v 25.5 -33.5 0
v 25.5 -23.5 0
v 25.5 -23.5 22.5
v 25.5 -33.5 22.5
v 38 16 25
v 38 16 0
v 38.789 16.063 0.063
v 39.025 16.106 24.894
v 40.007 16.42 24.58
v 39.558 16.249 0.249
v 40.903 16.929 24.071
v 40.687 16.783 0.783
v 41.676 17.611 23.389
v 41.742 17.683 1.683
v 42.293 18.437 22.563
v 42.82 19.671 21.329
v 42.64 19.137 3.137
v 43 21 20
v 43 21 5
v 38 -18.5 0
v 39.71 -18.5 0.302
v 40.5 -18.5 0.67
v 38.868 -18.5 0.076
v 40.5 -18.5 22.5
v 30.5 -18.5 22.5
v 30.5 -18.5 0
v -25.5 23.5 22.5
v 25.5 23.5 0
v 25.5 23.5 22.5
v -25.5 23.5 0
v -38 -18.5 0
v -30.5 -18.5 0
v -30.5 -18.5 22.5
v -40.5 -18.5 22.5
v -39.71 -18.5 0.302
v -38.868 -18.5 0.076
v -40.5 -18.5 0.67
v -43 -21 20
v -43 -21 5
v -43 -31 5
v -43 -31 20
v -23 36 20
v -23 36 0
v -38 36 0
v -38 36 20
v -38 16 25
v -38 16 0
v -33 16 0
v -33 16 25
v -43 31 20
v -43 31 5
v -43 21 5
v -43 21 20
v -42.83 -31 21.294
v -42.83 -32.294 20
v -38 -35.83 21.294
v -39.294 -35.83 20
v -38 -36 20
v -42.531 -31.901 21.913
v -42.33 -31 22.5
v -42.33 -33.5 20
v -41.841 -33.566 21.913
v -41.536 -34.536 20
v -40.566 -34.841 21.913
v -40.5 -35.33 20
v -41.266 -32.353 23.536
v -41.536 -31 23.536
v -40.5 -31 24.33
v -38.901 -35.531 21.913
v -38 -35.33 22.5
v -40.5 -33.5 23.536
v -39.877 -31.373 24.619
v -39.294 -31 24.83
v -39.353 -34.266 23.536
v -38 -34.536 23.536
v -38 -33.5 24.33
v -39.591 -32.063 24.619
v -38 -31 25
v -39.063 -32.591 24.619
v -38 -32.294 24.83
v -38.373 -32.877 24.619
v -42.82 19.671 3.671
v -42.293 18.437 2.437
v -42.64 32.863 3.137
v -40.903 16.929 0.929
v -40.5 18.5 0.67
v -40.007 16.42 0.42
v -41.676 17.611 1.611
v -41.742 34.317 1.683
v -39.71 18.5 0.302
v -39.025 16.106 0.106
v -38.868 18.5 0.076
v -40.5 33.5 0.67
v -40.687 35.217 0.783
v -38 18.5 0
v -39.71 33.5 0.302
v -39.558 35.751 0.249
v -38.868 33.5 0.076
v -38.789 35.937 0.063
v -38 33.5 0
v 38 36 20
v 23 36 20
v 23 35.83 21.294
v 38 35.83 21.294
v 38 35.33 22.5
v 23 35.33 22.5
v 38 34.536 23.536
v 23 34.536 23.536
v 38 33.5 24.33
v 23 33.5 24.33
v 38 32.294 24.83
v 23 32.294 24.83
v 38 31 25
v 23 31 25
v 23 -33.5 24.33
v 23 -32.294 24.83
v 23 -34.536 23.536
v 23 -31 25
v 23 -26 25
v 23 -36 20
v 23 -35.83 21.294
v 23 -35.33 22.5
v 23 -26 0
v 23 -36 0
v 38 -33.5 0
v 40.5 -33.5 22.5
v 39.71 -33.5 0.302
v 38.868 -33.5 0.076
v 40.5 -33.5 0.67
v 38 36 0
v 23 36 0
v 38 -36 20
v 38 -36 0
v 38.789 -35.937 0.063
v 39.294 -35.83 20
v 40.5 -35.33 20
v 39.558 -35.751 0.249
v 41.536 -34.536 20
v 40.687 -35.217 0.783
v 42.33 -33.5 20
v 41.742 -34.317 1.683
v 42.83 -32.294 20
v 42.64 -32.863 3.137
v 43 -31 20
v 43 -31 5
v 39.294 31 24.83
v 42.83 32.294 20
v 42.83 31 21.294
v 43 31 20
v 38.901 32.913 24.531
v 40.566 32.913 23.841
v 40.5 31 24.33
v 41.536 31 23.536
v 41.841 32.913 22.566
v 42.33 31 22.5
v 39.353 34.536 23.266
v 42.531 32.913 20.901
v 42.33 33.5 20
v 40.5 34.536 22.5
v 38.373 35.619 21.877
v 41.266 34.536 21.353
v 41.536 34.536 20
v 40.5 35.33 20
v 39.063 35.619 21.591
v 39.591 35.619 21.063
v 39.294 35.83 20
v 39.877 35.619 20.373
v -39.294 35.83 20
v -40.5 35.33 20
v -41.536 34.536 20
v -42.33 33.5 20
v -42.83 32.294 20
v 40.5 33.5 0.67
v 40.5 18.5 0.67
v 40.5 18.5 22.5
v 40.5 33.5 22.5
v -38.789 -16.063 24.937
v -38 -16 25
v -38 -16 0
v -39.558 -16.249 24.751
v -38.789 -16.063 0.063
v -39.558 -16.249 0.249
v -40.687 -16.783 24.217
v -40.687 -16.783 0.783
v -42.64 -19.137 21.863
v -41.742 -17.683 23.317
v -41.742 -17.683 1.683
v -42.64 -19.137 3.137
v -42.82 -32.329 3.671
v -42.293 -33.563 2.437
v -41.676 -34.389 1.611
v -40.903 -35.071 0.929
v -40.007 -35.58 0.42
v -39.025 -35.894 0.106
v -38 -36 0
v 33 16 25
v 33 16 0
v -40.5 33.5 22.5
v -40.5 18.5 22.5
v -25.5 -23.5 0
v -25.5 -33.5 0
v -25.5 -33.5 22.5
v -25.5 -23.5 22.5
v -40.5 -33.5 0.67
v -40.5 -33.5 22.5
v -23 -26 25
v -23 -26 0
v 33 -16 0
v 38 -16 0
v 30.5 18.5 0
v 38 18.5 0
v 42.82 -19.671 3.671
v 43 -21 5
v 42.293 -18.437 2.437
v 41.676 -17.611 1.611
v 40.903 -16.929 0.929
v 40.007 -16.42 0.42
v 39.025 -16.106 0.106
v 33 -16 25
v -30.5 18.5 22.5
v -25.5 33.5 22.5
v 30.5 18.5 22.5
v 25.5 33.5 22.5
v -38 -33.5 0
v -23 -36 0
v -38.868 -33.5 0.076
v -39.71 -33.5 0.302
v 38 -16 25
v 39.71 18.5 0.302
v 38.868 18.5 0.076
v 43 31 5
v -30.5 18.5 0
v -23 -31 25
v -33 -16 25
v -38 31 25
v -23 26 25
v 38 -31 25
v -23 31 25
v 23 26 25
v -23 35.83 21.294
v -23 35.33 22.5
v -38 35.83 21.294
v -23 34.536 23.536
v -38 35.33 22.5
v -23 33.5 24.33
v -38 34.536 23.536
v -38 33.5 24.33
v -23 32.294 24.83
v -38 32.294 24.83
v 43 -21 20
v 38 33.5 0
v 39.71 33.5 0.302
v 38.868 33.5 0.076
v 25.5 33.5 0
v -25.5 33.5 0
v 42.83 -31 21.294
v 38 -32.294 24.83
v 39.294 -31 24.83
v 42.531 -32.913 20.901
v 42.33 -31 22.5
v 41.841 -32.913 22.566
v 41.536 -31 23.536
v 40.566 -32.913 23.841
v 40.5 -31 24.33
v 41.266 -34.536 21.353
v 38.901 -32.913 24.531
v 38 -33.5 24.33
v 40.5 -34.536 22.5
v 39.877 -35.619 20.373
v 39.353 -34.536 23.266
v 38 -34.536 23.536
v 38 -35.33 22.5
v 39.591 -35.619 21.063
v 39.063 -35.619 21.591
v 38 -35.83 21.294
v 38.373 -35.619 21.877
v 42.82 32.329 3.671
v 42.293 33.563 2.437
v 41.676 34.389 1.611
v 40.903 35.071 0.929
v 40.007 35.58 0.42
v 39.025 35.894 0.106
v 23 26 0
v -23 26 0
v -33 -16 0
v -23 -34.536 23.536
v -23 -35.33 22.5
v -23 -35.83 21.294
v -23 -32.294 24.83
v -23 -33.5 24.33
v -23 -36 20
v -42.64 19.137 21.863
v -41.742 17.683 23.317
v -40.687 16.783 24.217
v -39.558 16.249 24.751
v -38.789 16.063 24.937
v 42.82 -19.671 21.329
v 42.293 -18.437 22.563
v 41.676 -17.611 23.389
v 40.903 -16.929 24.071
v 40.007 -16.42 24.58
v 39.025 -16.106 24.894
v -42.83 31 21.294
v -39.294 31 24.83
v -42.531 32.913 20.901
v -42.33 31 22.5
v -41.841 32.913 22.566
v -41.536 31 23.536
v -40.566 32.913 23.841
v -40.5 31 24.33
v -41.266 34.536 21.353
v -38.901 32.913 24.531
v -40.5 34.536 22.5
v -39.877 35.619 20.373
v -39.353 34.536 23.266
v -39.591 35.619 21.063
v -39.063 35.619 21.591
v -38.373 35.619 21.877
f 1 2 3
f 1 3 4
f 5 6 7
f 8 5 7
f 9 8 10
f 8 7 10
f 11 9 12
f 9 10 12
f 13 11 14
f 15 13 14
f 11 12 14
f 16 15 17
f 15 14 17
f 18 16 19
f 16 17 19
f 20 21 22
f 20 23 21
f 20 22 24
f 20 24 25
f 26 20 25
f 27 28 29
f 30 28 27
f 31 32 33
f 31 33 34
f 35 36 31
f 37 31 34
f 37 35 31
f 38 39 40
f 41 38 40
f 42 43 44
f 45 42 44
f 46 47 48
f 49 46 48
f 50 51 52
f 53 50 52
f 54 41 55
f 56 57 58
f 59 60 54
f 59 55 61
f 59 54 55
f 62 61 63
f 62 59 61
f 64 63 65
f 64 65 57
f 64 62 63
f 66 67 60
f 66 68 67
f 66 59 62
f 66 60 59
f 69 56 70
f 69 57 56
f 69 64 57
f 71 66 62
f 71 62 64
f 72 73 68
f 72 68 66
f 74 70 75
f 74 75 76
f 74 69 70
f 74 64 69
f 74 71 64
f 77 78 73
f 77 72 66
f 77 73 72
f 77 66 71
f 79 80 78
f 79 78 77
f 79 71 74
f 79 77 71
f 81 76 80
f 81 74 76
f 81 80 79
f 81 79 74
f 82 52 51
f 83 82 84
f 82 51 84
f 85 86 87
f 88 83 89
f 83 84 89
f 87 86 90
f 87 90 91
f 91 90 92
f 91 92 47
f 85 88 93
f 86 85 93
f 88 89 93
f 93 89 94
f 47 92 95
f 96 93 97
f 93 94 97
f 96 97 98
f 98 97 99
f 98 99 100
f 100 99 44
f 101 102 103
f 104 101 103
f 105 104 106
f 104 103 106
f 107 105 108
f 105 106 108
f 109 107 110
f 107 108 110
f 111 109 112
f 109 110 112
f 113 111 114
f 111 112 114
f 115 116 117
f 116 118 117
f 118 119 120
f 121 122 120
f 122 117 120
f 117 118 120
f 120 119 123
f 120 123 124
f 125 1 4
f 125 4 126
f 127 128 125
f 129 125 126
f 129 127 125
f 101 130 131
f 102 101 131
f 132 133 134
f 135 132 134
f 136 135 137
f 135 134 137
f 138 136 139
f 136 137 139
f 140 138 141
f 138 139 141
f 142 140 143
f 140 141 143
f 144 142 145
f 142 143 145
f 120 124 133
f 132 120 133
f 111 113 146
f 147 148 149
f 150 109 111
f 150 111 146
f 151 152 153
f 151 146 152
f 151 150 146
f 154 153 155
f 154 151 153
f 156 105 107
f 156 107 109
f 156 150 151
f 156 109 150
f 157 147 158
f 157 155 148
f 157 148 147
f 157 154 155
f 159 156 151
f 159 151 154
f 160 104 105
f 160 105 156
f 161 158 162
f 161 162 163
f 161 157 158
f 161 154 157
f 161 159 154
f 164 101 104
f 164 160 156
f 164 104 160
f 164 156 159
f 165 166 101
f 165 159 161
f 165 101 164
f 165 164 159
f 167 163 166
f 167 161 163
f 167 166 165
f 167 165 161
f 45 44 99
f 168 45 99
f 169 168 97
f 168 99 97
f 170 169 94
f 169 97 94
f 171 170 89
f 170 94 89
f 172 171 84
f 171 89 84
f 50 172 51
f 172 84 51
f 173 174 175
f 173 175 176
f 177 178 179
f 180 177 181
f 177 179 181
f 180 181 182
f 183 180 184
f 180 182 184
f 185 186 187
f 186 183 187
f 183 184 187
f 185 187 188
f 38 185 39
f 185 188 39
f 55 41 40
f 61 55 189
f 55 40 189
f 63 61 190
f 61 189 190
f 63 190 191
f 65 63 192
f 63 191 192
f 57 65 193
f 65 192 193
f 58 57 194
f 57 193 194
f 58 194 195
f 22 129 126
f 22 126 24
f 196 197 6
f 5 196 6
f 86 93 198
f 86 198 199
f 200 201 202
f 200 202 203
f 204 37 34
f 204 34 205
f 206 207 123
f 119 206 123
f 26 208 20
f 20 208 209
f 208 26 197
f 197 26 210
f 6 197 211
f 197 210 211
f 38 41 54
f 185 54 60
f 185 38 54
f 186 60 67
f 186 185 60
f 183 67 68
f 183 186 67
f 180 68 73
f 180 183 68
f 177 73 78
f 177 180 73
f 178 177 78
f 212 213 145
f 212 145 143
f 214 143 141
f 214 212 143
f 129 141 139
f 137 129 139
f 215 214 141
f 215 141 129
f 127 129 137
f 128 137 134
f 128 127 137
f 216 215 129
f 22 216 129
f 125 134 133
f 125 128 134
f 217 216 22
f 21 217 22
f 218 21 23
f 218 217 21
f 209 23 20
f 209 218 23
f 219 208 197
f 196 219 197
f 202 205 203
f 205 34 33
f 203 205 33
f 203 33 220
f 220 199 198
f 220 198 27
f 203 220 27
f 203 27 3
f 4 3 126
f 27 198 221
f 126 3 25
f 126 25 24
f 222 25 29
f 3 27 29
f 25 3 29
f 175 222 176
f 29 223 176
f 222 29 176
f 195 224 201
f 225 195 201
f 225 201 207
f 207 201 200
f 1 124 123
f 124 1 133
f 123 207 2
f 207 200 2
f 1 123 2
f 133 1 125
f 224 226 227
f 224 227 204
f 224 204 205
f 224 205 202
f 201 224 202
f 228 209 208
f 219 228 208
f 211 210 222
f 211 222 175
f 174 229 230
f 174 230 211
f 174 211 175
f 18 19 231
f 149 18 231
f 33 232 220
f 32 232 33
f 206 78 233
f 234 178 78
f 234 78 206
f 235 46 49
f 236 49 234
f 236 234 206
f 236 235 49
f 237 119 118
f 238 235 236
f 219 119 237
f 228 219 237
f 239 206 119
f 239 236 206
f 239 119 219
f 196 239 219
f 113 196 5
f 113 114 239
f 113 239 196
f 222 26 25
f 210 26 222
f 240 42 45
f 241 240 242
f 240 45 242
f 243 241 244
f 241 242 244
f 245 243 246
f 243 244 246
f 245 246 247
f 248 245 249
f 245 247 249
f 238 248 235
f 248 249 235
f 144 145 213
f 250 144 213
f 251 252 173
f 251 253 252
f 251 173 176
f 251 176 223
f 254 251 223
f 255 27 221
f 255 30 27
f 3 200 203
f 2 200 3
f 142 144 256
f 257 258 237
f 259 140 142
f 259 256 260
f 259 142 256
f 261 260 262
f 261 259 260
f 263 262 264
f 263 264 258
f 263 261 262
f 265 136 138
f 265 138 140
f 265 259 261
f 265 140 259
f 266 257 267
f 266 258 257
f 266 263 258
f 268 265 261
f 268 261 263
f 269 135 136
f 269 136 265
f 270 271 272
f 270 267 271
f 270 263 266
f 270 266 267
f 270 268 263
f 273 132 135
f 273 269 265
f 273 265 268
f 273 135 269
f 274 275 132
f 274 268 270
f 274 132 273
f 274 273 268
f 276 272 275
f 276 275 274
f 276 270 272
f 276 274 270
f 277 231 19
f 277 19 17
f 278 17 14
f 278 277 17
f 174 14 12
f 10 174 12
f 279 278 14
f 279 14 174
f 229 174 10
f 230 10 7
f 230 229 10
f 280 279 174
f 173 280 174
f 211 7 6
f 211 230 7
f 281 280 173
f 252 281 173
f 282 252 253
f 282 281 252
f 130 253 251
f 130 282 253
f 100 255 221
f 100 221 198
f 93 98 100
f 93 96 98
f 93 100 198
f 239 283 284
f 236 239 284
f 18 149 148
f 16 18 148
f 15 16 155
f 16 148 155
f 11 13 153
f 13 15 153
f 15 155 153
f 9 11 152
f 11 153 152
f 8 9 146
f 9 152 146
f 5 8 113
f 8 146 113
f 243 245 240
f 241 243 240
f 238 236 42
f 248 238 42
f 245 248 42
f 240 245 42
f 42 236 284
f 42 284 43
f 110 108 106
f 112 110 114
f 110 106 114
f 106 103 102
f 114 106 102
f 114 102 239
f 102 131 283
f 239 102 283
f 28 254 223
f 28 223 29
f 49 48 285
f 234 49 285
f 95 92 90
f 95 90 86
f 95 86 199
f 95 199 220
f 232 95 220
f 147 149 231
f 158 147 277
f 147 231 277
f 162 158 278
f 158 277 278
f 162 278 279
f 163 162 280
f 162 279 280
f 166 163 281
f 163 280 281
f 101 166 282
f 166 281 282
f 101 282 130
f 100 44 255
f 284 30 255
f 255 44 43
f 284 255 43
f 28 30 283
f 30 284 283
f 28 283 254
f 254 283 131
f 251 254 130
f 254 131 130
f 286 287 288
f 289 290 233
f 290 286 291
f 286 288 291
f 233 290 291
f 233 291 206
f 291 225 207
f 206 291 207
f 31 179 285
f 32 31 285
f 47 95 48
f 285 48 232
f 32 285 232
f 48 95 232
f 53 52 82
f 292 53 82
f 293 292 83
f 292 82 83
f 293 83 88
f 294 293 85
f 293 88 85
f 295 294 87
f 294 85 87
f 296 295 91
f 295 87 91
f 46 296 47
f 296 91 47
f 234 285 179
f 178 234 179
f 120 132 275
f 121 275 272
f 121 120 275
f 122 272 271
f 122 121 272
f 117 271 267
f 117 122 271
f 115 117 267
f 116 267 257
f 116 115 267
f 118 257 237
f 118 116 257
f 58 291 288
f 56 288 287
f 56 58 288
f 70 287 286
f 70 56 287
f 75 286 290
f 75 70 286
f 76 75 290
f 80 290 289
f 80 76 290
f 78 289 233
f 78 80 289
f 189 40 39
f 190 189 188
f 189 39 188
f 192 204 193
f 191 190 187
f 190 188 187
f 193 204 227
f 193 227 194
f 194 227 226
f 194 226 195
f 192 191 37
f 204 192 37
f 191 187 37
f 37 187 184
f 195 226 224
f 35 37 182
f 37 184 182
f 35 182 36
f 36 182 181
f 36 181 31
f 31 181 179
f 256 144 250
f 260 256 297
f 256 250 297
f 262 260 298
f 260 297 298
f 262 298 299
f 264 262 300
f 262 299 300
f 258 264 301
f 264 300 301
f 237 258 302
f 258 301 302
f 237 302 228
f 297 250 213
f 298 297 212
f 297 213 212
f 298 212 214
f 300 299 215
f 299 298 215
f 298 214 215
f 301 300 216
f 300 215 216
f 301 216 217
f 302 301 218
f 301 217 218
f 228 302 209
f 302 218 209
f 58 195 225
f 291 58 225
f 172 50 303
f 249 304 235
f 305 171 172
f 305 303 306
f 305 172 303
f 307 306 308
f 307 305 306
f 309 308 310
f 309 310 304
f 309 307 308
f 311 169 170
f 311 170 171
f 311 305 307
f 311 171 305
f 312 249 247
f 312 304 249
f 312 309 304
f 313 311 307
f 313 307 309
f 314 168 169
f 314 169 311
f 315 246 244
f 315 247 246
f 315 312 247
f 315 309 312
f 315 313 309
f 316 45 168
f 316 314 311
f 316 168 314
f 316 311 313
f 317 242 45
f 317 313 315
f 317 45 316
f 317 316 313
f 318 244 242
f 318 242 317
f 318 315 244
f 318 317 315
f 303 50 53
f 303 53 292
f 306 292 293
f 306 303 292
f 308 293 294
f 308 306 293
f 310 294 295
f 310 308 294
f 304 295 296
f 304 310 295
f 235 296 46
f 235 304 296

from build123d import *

# Parameters (mm, degrees)
F0_W         = 10
F0_H         = 10
F1_DEPTH     = 25
F2_T         = -2.5
F3_T1_DEPTH  = 27.5
F3_T3_DEPTH  = 27.5
F3_T5_DEPTH  = 27.5
F3_T7_DEPTH  = 27.5
F3_T9_DEPTH  = 32.5
F3_T11_DEPTH = 50
F3_T13_DEPTH = 45
F3_T15_DEPTH = 45
F3_S19_W     = 5
F3_S19_H     = 5
F3_T20_DEPTH = 5
F3_S25_W     = 5
F3_S25_H     = 5
F3_T26_DEPTH = 5
F3_S31_W     = 5
F3_S31_H     = 5
F3_T32_DEPTH = 5
F3_S37_W     = 5
F3_S37_H     = 5
F3_T38_DEPTH = 5


# Not quite as in the source:
# - a fillet or chamfer that OpenCascade refuses, or shapes differently, is made with other operations: its cross-section is extruded or revolved along the edge and cut away or added


with BuildPart() as f1:
    # F0 (on Top) → F1 (new body)
    with BuildSketch(Plane.XY):
        Polygon((-33, 16), (-33, 26), (-23, 26), (-23, 36), (-43, 36), (-43, 16), align=None)
        with Locations((-28, 21)):
            Rectangle(F0_W, F0_H)
        Polygon((23, 26), (-23, 26), (-23, 16), (-33, 16), (-33, -16), (-23, -16), (-23, -26), (23, -26), (23, -16), (33, -16), (33, 16), (23, 16), align=None)
        Polygon((23, 36), (23, 26), (33, 26), (33, 16), (43, 16), (43, 36), align=None)
        with Locations((28, 21)):
            Rectangle(F0_W, F0_H)
        with Locations((-28, -21)):
            Rectangle(F0_W, F0_H)
        Polygon((-33, -26), (-33, -16), (-43, -16), (-43, -36), (-23, -36), (-23, -26), align=None)
        Polygon((43, -16), (33, -16), (33, -26), (23, -26), (23, -36), (43, -36), align=None)
        with Locations((28, -21)):
            Rectangle(F0_W, F0_H)
    extrude(amount=F1_DEPTH)

    # F2
    f2_openings = [f1.faces().sort_by_distance(p)[0] for p in [
        (0, 0, 0),
    ]]
    offset(amount=F2_T, openings=f2_openings, kind=Kind.INTERSECTION)

    # F3: fillet of radius 5 on 20 edges, made by hand

    # F3_s2 → F3_t1 (cut)
    with BuildSketch(Plane.YZ.offset(-38)):
        with BuildLine():
            ThreePointArc((36, 20), (34.5355339059, 23.5355339059), (31, 25))
            Line((31, 25), (36, 25))
            Line((36, 25), (36, 20))
        make_face()
        with BuildLine():
            ThreePointArc((-36, 20), (-34.5355339059, 23.5355339059), (-31, 25))
            Line((-31, 25), (-36, 25))
            Line((-36, 25), (-36, 20))
        make_face()
    extrude(amount=F3_T1_DEPTH, mode=Mode.SUBTRACT)

    # F3_s4 → F3_t3 (cut)
    with BuildSketch(Plane.YZ.offset(10.5)):
        with BuildLine():
            ThreePointArc((-36, 20), (-34.5355339059, 23.5355339059), (-31, 25))
            Line((-31, 25), (-36, 25))
            Line((-36, 25), (-36, 20))
        make_face()
        with BuildLine():
            ThreePointArc((36, 20), (34.5355339059, 23.5355339059), (31, 25))
            Line((31, 25), (36, 25))
            Line((36, 25), (36, 20))
        make_face()
    extrude(amount=F3_T3_DEPTH, mode=Mode.SUBTRACT)

    # F3_s6 → F3_t5 (cut)
    with BuildSketch(Plane.XZ.offset(-31)):
        with BuildLine():
            ThreePointArc((43, 20), (41.5355339059, 23.5355339059), (38, 25))
            Line((38, 25), (43, 25))
            Line((43, 25), (43, 20))
        make_face()
        with BuildLine():
            ThreePointArc((-43, 20), (-41.5355339059, 23.5355339059), (-38, 25))
            Line((-38, 25), (-43, 25))
            Line((-43, 25), (-43, 20))
        make_face()
    extrude(amount=F3_T5_DEPTH, mode=Mode.SUBTRACT)

    # F3_s8 → F3_t7 (cut)
    with BuildSketch(Plane.XZ.offset(3.5)):
        with BuildLine():
            ThreePointArc((43, 20), (41.5355339059, 23.5355339059), (38, 25))
            Line((38, 25), (43, 25))
            Line((43, 25), (43, 20))
        make_face()
        with BuildLine():
            ThreePointArc((-43, 20), (-41.5355339059, 23.5355339059), (-38, 25))
            Line((-38, 25), (-43, 25))
            Line((-43, 25), (-43, 20))
        make_face()
    extrude(amount=F3_T7_DEPTH, mode=Mode.SUBTRACT)

    # F3_s10 → F3_t9 (cut)
    with BuildSketch(Plane.XY.offset(-12.5)):
        with BuildLine():
            ThreePointArc((-38, 36), (-41.5355339059, 34.5355339059), (-43, 31))
            Line((-43, 31), (-43, 36))
            Line((-43, 36), (-38, 36))
        make_face()
        with BuildLine():
            ThreePointArc((43, 31), (41.5355339059, 34.5355339059), (38, 36))
            Line((38, 36), (43, 36))
            Line((43, 36), (43, 31))
        make_face()
        with BuildLine():
            ThreePointArc((38, -36), (41.5355339059, -34.5355339059), (43, -31))
            Line((43, -31), (43, -36))
            Line((43, -36), (38, -36))
        make_face()
        with BuildLine():
            ThreePointArc((-43, -31), (-41.5355339059, -34.5355339059), (-38, -36))
            Line((-38, -36), (-43, -36))
            Line((-43, -36), (-43, -31))
        make_face()
    extrude(amount=F3_T9_DEPTH, mode=Mode.SUBTRACT)

    # F3_s12 → F3_t11 (cut)
    with BuildSketch(Plane.XY.offset(-12.5)):
        with BuildLine():
            ThreePointArc((-43, 21), (-41.5355339059, 17.4644660941), (-38, 16))
            Line((-38, 16), (-43, 16))
            Line((-43, 16), (-43, 21))
        make_face()
        with BuildLine():
            ThreePointArc((38, 16), (41.5355339059, 17.4644660941), (43, 21))
            Line((43, 21), (43, 16))
            Line((43, 16), (38, 16))
        make_face()
        with BuildLine():
            ThreePointArc((43, -21), (41.5355339059, -17.4644660941), (38, -16))
            Line((38, -16), (43, -16))
            Line((43, -16), (43, -21))
        make_face()
        with BuildLine():
            ThreePointArc((-38, -16), (-41.5355339059, -17.4644660941), (-43, -21))
            Line((-43, -21), (-43, -16))
            Line((-43, -16), (-38, -16))
        make_face()
    extrude(amount=F3_T11_DEPTH, mode=Mode.SUBTRACT)

    # F3_s14 → F3_t13 (cut)
    with BuildSketch(Plane.XZ.offset(-48.5)):
        with BuildLine():
            ThreePointArc((-43, 5), (-41.5355339059, 1.4644660941), (-38, 0))
            Line((-38, 0), (-43, 0))
            Line((-43, 0), (-43, 5))
        make_face()
        with BuildLine():
            ThreePointArc((43, 5), (41.5355339059, 1.4644660941), (38, 0))
            Line((38, 0), (43, 0))
            Line((43, 0), (43, 5))
        make_face()
    extrude(amount=F3_T13_DEPTH, mode=Mode.SUBTRACT)

    # F3_s16 → F3_t15 (cut)
    with BuildSketch(Plane.XZ.offset(3.5)):
        with BuildLine():
            ThreePointArc((43, 5), (41.5355339059, 1.4644660941), (38, 0))
            Line((38, 0), (43, 0))
            Line((43, 0), (43, 5))
        make_face()
        with BuildLine():
            ThreePointArc((-43, 5), (-41.5355339059, 1.4644660941), (-38, 0))
            Line((-38, 0), (-43, 0))
            Line((-43, 0), (-43, 5))
        make_face()
    extrude(amount=F3_T15_DEPTH, mode=Mode.SUBTRACT)


with BuildPart() as f3_tool18:
    # F3_s19 → F3_t20 (new body)
    with BuildSketch(Plane.XZ.offset(-31)):
        with Locations((-40.5, 22.5)):
            Rectangle(F3_S19_W, F3_S19_H)
    extrude(amount=-F3_T20_DEPTH)

    # F3_s21 → F3_t22 (revolve, cut)
    with BuildSketch(Plane(origin=(-38, 31, 20), x_dir=(0.7071067812, 0, -0.7071067812), z_dir=(0.7071067812, 0, 0.7071067812))):
        with BuildLine():
            ThreePointArc((0, -5), (5, 0), (0, 5))
            Line((0, 5), (0, -5))
        make_face()
    revolve(axis=Axis((-38, 31, 20), (0, 1, 0)), mode=Mode.SUBTRACT)


with BuildPart() as f1_1:
    add(f1.part)

    # F3_t17: cut F3_tool18
    add(f3_tool18.part, mode=Mode.SUBTRACT)


with BuildPart() as f3_tool24:
    # F3_s25 → F3_t26 (new body)
    with BuildSketch(Plane.XY.offset(20)):
        with Locations((-40.5, -33.5)):
            Rectangle(F3_S25_W, F3_S25_H)
    extrude(amount=F3_T26_DEPTH)

    # F3_s27 → F3_t28 (revolve, cut)
    with BuildSketch(Plane(origin=(-38, -31, 20), x_dir=(0.7071067812, 0.7071067812, 0), z_dir=(0.7071067812, -0.7071067812, 0))):
        with BuildLine():
            ThreePointArc((0, -5), (5, 0), (0, 5))
            Line((0, 5), (0, -5))
        make_face()
    revolve(axis=Axis((-38, -31, 20), (0, 0, 1)), mode=Mode.SUBTRACT)


with BuildPart() as f1_2:
    add(f1_1.part)

    # F3_t23: cut F3_tool24
    add(f3_tool24.part, mode=Mode.SUBTRACT)


with BuildPart() as f3_tool30:
    # F3_s31 → F3_t32 (new body)
    with BuildSketch(Plane.XZ.offset(31)):
        with Locations((40.5, 22.5)):
            Rectangle(F3_S31_W, F3_S31_H)
    extrude(amount=F3_T32_DEPTH)

    # F3_s33 → F3_t34 (revolve, cut)
    with BuildSketch(Plane(origin=(38, -31, 20), x_dir=(-0.7071067812, 0, -0.7071067812), z_dir=(-0.7071067812, 0, 0.7071067812))):
        with BuildLine():
            ThreePointArc((0, -5), (5, 0), (0, 5))
            Line((0, 5), (0, -5))
        make_face()
    revolve(axis=Axis((38, -31, 20), (0, -1, 0)), mode=Mode.SUBTRACT)


with BuildPart() as f1_3:
    add(f1_2.part)

    # F3_t29: cut F3_tool30
    add(f3_tool30.part, mode=Mode.SUBTRACT)


with BuildPart() as f3_tool36:
    # F3_s37 → F3_t38 (new body)
    with BuildSketch(Plane.XZ.offset(-31)):
        with Locations((40.5, 22.5)):
            Rectangle(F3_S37_W, F3_S37_H)
    extrude(amount=-F3_T38_DEPTH)

    # F3_s39 → F3_t40 (revolve, cut)
    with BuildSketch(Plane(origin=(38, 31, 20), x_dir=(-0.7071067812, 0, -0.7071067812), z_dir=(0.7071067812, 0, -0.7071067812))):
        with BuildLine():
            ThreePointArc((0, -5), (5, 0), (0, 5))
            Line((0, 5), (0, -5))
        make_face()
    revolve(axis=Axis((38, 31, 20), (0, 1, 0)), mode=Mode.SUBTRACT)


with BuildPart() as f1_4:
    add(f1_3.part)

    # F3_t35: cut F3_tool36
    add(f3_tool36.part, mode=Mode.SUBTRACT)


solid = f1_4.part
